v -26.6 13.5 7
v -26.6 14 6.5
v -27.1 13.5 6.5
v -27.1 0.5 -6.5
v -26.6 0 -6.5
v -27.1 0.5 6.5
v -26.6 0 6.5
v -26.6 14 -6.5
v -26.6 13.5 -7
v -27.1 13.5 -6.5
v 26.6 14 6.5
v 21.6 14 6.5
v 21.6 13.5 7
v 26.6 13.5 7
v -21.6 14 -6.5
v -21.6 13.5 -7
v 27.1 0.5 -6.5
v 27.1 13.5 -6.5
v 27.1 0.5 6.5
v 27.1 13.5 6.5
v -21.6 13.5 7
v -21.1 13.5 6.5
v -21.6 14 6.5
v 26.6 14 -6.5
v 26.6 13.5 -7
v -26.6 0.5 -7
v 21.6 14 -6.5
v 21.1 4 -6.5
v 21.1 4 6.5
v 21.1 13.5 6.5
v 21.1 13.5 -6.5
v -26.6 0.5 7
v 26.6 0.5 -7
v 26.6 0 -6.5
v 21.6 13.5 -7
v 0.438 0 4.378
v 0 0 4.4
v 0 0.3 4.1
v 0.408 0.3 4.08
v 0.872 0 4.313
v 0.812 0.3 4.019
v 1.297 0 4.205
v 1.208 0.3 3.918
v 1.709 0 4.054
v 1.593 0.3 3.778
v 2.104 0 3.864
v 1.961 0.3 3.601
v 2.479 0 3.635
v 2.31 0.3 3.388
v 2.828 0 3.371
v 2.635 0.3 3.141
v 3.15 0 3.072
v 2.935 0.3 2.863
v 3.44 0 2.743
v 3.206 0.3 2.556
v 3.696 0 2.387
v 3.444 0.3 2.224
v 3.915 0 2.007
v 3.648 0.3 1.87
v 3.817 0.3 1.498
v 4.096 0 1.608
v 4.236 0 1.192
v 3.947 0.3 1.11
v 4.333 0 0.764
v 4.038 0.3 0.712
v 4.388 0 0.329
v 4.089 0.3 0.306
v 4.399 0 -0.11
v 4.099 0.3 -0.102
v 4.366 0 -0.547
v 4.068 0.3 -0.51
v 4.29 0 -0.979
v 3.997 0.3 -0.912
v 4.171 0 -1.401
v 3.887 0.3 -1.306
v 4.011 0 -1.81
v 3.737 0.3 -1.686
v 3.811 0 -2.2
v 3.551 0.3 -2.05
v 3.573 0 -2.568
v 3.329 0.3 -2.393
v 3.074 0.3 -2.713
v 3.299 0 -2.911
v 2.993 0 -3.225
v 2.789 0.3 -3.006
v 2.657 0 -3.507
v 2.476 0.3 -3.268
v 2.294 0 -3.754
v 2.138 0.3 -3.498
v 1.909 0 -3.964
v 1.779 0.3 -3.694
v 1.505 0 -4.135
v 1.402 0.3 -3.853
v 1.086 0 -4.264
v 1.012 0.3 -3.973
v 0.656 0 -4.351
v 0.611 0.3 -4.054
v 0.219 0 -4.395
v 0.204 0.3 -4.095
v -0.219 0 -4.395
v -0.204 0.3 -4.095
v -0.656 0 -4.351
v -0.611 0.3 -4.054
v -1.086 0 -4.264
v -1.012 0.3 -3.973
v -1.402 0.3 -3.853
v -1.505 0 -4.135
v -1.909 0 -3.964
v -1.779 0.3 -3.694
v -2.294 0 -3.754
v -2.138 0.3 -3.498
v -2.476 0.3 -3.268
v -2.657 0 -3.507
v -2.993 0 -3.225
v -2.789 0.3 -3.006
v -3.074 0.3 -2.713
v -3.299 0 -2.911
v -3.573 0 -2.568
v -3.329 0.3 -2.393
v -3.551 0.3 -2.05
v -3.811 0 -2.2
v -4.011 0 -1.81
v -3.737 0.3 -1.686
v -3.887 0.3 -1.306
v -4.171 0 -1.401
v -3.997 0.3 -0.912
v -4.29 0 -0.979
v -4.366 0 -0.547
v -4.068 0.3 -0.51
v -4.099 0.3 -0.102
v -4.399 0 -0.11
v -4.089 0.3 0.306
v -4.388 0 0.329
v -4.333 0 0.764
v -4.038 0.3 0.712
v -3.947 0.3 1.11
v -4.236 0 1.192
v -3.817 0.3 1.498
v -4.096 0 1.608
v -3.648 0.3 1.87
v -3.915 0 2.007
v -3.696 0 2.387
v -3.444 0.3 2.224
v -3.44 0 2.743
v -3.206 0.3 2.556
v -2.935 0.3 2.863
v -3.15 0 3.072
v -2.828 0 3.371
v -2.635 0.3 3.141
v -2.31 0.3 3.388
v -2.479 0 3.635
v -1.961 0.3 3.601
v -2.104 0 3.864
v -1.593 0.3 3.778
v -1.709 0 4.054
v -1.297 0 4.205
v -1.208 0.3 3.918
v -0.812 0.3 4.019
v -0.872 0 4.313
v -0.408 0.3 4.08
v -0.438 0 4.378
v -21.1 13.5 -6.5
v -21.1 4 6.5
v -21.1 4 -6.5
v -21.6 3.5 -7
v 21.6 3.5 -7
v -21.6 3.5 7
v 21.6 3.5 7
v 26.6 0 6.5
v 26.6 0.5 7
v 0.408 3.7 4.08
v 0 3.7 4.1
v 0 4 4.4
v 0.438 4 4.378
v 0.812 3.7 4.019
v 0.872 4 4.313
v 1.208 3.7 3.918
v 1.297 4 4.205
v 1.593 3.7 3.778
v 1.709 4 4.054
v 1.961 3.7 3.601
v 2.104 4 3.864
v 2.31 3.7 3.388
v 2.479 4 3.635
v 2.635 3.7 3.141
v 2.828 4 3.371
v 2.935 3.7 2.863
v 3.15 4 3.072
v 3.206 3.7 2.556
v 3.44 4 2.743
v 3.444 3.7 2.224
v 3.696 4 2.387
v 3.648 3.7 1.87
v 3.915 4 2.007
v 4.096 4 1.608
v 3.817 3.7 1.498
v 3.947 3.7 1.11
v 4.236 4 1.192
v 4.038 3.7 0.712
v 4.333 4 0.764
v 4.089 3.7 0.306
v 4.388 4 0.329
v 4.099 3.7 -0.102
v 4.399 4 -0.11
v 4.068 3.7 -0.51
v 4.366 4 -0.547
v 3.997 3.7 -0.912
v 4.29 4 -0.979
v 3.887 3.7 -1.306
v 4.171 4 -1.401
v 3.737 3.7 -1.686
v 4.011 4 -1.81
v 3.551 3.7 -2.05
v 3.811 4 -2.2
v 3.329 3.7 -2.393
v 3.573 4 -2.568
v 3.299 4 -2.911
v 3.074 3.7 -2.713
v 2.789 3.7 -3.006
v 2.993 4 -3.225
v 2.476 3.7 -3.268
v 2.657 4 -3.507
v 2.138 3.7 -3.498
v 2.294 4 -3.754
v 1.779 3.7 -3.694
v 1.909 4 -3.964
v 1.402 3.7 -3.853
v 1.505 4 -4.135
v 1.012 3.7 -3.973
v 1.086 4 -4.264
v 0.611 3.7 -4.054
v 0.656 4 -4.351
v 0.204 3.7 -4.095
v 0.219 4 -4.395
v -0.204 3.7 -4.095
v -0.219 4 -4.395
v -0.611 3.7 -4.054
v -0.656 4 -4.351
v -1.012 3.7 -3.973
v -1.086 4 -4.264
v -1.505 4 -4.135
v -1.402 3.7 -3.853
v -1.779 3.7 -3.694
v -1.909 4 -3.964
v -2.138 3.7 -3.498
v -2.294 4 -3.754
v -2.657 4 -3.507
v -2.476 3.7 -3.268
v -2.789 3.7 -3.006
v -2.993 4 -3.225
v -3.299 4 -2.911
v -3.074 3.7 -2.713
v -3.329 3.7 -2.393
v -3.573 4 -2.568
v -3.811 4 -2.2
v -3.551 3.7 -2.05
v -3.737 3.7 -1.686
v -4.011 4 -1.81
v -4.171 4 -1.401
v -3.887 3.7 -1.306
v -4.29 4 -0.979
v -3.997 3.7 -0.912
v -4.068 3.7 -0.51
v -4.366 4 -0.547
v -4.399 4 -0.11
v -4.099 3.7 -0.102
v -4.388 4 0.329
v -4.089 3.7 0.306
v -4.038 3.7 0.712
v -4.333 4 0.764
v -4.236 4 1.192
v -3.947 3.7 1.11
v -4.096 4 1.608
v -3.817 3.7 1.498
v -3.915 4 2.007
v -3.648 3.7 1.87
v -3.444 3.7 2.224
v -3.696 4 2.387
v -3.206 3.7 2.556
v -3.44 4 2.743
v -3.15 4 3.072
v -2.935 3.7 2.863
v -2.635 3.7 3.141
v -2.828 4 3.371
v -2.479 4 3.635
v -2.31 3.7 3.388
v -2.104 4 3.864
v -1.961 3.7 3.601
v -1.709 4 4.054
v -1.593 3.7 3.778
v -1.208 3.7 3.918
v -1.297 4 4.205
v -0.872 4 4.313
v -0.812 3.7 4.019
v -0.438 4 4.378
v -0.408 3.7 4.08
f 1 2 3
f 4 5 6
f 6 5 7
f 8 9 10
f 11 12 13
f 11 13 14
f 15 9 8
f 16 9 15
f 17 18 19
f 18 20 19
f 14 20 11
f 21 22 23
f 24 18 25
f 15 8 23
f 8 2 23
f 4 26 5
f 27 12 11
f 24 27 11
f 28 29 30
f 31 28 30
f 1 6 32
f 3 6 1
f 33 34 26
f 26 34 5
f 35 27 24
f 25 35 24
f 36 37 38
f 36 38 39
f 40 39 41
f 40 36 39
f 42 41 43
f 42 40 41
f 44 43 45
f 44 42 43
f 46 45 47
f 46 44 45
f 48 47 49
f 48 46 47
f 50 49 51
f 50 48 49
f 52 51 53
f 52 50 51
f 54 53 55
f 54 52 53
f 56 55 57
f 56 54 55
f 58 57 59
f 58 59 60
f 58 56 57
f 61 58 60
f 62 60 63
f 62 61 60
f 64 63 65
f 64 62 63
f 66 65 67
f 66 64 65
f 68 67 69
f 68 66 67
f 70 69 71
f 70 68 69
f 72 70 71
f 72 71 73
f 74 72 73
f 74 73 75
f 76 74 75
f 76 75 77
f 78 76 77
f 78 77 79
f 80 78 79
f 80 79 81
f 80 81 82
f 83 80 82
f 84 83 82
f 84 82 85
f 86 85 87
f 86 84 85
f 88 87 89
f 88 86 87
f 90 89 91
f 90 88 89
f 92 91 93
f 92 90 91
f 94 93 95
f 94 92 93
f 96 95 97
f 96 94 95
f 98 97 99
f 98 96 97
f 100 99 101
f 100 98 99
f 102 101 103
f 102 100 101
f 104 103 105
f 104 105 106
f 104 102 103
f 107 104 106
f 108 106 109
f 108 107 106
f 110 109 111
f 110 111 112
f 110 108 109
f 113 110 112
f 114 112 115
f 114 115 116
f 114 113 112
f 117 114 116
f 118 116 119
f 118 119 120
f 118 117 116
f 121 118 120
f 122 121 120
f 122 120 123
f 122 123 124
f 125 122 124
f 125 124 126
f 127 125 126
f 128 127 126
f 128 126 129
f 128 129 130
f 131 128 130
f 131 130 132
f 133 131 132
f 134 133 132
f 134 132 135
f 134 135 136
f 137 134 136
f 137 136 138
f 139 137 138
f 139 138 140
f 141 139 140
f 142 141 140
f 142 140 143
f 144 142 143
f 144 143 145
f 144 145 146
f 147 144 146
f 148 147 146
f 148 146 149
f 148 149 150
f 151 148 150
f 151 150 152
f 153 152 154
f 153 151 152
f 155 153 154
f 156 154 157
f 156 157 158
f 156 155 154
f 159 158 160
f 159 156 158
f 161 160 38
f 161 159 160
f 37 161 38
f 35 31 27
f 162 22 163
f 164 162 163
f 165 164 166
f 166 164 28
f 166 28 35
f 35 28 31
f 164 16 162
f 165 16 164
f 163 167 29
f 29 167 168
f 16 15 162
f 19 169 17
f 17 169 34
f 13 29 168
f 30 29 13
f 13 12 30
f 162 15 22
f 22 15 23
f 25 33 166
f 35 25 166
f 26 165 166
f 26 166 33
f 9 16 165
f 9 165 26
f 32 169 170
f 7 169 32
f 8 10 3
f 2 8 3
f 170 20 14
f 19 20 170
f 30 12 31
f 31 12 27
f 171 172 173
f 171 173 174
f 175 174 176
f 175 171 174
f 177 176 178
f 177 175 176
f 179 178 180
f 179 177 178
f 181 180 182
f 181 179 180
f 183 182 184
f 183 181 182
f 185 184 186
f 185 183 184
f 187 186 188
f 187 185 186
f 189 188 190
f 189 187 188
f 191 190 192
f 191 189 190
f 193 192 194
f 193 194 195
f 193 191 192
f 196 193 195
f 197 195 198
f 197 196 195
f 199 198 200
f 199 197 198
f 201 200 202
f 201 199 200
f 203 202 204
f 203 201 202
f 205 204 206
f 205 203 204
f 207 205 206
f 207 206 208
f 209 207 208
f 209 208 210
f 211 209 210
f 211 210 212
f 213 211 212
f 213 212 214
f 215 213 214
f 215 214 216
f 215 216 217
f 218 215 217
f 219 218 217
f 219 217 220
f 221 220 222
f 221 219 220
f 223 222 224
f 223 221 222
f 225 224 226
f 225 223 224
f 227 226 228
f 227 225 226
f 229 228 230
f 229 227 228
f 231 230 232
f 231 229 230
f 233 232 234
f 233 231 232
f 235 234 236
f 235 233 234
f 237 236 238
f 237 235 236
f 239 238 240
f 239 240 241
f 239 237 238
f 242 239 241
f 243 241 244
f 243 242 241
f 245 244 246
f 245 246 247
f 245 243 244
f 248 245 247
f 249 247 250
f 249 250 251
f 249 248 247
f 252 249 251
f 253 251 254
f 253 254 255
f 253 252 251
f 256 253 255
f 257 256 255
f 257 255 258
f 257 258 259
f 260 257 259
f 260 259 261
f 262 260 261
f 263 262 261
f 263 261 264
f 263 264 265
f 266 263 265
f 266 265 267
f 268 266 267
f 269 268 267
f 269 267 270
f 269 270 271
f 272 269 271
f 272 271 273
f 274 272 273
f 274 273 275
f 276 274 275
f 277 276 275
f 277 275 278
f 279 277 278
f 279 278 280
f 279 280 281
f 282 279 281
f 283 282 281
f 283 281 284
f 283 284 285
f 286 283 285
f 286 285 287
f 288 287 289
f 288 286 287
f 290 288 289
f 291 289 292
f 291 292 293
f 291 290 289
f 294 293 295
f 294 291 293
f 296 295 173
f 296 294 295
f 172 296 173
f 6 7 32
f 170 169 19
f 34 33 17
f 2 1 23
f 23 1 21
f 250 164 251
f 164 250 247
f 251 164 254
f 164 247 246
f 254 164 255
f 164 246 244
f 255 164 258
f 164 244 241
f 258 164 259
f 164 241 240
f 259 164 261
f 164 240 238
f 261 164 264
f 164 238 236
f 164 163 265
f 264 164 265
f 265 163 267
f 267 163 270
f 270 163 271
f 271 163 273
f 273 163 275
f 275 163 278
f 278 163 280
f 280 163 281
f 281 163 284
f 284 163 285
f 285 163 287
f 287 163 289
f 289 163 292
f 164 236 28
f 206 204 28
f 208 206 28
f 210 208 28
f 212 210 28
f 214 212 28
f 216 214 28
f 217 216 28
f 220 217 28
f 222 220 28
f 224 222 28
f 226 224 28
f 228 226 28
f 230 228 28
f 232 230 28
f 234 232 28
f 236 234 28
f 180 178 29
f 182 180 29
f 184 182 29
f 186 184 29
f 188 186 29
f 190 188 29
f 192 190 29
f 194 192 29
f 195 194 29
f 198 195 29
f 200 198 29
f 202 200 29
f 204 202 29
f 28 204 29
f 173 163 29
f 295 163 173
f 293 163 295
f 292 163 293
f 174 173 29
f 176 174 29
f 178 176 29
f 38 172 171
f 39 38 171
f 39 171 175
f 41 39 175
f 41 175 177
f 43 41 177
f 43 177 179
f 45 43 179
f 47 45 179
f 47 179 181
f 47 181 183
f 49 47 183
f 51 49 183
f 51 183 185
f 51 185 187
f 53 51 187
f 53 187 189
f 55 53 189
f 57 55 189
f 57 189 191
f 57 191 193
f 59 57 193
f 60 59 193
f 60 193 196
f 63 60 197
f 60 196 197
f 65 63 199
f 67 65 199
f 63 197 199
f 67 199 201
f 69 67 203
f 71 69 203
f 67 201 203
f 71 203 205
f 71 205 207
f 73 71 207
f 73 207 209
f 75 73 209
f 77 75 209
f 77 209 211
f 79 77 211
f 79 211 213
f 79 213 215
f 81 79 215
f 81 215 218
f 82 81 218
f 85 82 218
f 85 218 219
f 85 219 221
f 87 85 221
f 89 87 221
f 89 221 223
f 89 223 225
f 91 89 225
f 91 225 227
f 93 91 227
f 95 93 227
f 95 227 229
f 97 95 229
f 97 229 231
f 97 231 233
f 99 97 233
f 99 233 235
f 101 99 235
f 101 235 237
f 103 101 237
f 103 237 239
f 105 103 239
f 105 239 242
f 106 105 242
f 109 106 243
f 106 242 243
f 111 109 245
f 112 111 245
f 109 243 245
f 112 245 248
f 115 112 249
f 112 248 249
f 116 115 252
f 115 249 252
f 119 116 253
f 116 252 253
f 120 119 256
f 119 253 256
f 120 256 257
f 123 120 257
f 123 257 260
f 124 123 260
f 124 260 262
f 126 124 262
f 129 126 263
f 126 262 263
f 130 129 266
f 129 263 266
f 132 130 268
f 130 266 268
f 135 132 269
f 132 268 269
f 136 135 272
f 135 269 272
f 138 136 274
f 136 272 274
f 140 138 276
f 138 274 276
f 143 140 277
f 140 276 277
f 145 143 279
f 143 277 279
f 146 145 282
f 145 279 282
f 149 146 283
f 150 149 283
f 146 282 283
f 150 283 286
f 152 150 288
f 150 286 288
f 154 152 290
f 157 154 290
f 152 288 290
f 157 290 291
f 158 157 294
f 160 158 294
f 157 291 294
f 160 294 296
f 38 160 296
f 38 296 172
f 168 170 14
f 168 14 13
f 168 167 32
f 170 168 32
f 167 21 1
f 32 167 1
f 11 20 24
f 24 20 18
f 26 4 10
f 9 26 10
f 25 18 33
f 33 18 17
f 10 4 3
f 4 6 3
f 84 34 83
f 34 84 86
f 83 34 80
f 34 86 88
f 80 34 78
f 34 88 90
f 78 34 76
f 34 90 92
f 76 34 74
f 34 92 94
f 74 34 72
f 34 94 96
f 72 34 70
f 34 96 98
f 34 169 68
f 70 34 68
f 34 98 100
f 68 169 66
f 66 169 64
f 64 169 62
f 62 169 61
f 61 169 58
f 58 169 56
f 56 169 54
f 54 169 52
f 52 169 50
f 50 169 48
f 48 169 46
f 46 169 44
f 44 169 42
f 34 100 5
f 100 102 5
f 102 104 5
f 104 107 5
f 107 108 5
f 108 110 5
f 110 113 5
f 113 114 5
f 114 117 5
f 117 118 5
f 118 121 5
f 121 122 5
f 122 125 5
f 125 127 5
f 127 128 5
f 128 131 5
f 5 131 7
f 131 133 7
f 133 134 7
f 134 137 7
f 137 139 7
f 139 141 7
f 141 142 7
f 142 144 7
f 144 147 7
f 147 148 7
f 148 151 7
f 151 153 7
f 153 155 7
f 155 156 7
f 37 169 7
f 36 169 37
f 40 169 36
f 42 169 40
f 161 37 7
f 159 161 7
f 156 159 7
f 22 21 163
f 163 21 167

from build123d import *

# Parameters (mm, degrees)
BOSS_EXTRUDE1_DEPTH = 7
SKETCH2_R           = 4.1
CUT_EXTRUDE1_DEPTH  = 30.722213915
CHAMFER1_SIZE       = 0.5
CHAMFER2_SIZE       = 0.3


with BuildPart() as part:
    # Sketch1 → Boss-Extrude1 (new, symmetric)
    with BuildSketch(Plane.XY):
        Polygon((-21.1, 14), (-21.1, 4), (21.1, 4), (21.1, 14), (27.1, 14), (27.1, 0), (-27.1, 0), (-27.1, 14), align=None)
    extrude(amount=BOSS_EXTRUDE1_DEPTH, both=True)

    # Sketch2 → Cut-Extrude1 (cut, through all)
    with BuildSketch(Plane(origin=(0, 4, 0), x_dir=(1, 0, 0), z_dir=(0, 1, 0))):
        with Locations(Location((0, 0, 0), (0, 0, 270))):
            Circle(SKETCH2_R)
    extrude(amount=-CUT_EXTRUDE1_DEPTH, mode=Mode.SUBTRACT)

    # Chamfer1
    chamfer1_edges = [part.edges().sort_by_distance(p)[0] for p in [
        (27.1, 7, -7),
        (0, 0, -7),
        (-27.1, 7, -7),
        (-24.1, 14, -7),
        (0, 0, 7),
        (-21.1, 14, 0),
        (21.1, 14, 0),
        (27.1, 14, 0),
        (27.1, 0, 0),
        (-27.1, 0, 0),
        (-27.1, 14, 0),
        (27.1, 7, 7),
        (24.1, 14, 7),
        (21.1, 9, 7),
        (0, 4, 7),
        (-21.1, 9, 7),
        (-24.1, 14, 7),
        (-21.1, 9, -7),
        (-27.1, 7, 7),
        (0, 4, -7),
        (21.1, 9, -7),
        (24.1, 14, -7),
    ]]
    chamfer(chamfer1_edges, length=CHAMFER1_SIZE)

    # Chamfer2
    chamfer2_edges = [part.edges().sort_by_distance(p)[0] for p in [
        (0, 0, -4.1),
        (0, 4, -4.1),
    ]]
    chamfer(chamfer2_edges, length=CHAMFER2_SIZE)


solid = part.part
